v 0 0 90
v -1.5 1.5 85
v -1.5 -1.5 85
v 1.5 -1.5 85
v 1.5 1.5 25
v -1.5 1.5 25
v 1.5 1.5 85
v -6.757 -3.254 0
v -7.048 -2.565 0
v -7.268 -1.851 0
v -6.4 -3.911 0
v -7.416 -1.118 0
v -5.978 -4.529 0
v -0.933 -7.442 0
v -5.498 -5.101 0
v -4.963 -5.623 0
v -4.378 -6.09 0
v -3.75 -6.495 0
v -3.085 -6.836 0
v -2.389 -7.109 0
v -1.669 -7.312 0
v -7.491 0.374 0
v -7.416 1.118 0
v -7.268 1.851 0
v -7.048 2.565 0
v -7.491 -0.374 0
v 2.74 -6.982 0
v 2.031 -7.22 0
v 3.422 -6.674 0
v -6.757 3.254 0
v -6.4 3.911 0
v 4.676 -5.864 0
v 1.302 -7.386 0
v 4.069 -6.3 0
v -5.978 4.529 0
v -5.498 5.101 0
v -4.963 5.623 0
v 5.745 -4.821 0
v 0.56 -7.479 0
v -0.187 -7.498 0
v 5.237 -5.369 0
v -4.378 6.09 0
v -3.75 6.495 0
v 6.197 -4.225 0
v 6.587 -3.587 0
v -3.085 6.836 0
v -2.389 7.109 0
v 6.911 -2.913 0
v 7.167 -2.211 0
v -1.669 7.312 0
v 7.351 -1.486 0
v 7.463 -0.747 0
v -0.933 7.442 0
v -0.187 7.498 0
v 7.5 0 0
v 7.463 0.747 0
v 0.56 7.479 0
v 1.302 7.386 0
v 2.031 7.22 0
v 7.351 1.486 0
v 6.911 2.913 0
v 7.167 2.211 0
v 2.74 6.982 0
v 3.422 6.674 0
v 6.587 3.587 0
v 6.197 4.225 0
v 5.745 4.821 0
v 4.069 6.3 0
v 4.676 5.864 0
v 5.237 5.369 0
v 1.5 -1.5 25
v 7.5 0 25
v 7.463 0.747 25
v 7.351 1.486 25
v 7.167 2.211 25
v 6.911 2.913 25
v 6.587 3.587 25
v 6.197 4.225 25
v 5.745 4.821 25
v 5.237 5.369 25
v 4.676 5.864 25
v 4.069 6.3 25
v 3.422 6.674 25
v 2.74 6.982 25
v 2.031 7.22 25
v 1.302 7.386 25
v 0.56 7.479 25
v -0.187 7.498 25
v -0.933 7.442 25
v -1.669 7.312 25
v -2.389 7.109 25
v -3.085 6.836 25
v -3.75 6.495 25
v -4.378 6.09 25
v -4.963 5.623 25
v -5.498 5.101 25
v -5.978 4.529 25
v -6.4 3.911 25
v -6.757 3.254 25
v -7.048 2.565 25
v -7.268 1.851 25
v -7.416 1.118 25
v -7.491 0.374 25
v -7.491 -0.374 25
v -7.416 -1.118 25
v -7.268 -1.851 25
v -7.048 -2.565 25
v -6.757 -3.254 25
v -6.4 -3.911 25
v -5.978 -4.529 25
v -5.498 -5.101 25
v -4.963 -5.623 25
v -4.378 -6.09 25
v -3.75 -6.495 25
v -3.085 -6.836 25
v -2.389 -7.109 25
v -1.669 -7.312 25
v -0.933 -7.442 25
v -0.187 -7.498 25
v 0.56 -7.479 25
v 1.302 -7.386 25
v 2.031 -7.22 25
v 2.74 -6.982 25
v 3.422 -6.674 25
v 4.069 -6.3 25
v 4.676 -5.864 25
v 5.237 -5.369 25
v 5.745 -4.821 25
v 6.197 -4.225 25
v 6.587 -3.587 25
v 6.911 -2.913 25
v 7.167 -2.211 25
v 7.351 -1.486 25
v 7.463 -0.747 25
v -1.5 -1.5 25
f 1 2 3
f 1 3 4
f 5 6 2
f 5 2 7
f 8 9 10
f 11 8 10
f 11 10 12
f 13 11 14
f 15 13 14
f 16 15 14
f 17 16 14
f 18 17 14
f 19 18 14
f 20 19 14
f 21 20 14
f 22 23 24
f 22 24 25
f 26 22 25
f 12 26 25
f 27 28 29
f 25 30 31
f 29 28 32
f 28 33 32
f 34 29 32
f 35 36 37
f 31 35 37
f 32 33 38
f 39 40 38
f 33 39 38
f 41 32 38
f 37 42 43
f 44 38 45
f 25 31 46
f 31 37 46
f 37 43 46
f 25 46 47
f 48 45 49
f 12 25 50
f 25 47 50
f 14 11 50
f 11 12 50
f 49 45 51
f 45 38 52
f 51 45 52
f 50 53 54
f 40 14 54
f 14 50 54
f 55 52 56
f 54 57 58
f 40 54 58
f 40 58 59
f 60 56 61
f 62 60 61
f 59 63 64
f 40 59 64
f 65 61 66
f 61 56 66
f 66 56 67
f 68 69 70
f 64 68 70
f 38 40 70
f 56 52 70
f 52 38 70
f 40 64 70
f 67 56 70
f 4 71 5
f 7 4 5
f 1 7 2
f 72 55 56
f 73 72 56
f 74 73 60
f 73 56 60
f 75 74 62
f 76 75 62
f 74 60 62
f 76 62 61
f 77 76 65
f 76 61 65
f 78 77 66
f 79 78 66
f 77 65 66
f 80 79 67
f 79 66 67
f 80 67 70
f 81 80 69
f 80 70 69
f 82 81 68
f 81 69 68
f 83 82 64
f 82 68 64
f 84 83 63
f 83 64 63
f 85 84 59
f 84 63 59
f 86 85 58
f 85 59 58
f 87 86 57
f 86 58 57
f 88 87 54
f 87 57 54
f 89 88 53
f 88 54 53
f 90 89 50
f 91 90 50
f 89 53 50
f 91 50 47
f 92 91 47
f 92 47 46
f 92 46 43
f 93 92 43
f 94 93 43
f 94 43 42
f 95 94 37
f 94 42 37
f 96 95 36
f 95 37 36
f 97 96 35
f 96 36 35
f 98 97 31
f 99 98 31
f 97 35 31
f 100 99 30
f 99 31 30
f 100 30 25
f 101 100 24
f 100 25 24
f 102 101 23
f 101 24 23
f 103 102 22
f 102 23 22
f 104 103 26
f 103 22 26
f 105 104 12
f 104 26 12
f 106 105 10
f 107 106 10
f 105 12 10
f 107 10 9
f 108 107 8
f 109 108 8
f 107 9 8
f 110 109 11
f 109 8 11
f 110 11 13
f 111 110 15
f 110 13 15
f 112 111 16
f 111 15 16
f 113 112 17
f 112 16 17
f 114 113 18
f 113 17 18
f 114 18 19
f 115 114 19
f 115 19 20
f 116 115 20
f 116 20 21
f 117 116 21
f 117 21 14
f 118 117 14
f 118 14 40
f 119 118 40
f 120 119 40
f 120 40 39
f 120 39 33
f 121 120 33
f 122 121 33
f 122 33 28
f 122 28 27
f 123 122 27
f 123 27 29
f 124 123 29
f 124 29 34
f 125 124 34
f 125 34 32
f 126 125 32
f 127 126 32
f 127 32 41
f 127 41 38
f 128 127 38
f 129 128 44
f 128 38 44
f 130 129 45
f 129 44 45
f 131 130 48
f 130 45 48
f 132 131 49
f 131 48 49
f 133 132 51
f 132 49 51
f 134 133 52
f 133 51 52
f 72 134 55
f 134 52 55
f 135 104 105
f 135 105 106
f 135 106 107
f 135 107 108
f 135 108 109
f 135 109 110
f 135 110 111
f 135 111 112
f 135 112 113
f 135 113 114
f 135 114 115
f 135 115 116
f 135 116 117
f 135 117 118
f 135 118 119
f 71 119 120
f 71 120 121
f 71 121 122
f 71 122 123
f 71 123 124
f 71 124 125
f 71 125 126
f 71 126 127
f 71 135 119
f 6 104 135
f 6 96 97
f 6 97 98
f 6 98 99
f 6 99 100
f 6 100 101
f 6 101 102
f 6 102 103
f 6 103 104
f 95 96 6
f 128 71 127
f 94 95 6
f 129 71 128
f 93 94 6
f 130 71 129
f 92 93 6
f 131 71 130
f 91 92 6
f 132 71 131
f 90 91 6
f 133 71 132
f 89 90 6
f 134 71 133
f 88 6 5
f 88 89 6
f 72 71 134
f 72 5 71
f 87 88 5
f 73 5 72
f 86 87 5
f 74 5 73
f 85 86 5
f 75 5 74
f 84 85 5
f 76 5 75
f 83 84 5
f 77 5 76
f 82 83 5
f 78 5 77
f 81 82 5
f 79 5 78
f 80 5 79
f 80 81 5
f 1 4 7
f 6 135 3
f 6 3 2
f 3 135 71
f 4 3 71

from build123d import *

# Parameters (mm, degrees)
F0_R      = 7.5
F1_DEPTH  = 25
F2_W      = 3
F2_H      = 3
F3_DEPTH  = 60
F3_FACE_W = 3
F3_FACE_H = 3


with BuildPart() as f1:
    # F0 (on Top) → F1 (new body)
    with BuildSketch(Plane.XY):
        Circle(F0_R)
    extrude(amount=F1_DEPTH)

    # F2 (on face) → F3 (join)
    with BuildSketch(Plane.XY.offset(25)):
        Rectangle(F2_W, F2_H)
    extrude(amount=F3_DEPTH)

    # F3_face (on face) → F5 section 0
    with BuildSketch(Plane.XY.offset(85), mode=Mode.PRIVATE) as f5_s0:
        Rectangle(F3_FACE_W, F3_FACE_H)
    loft([f5_s0.sketch, Vertex(0, 0, 90)])


solid = f1.part
